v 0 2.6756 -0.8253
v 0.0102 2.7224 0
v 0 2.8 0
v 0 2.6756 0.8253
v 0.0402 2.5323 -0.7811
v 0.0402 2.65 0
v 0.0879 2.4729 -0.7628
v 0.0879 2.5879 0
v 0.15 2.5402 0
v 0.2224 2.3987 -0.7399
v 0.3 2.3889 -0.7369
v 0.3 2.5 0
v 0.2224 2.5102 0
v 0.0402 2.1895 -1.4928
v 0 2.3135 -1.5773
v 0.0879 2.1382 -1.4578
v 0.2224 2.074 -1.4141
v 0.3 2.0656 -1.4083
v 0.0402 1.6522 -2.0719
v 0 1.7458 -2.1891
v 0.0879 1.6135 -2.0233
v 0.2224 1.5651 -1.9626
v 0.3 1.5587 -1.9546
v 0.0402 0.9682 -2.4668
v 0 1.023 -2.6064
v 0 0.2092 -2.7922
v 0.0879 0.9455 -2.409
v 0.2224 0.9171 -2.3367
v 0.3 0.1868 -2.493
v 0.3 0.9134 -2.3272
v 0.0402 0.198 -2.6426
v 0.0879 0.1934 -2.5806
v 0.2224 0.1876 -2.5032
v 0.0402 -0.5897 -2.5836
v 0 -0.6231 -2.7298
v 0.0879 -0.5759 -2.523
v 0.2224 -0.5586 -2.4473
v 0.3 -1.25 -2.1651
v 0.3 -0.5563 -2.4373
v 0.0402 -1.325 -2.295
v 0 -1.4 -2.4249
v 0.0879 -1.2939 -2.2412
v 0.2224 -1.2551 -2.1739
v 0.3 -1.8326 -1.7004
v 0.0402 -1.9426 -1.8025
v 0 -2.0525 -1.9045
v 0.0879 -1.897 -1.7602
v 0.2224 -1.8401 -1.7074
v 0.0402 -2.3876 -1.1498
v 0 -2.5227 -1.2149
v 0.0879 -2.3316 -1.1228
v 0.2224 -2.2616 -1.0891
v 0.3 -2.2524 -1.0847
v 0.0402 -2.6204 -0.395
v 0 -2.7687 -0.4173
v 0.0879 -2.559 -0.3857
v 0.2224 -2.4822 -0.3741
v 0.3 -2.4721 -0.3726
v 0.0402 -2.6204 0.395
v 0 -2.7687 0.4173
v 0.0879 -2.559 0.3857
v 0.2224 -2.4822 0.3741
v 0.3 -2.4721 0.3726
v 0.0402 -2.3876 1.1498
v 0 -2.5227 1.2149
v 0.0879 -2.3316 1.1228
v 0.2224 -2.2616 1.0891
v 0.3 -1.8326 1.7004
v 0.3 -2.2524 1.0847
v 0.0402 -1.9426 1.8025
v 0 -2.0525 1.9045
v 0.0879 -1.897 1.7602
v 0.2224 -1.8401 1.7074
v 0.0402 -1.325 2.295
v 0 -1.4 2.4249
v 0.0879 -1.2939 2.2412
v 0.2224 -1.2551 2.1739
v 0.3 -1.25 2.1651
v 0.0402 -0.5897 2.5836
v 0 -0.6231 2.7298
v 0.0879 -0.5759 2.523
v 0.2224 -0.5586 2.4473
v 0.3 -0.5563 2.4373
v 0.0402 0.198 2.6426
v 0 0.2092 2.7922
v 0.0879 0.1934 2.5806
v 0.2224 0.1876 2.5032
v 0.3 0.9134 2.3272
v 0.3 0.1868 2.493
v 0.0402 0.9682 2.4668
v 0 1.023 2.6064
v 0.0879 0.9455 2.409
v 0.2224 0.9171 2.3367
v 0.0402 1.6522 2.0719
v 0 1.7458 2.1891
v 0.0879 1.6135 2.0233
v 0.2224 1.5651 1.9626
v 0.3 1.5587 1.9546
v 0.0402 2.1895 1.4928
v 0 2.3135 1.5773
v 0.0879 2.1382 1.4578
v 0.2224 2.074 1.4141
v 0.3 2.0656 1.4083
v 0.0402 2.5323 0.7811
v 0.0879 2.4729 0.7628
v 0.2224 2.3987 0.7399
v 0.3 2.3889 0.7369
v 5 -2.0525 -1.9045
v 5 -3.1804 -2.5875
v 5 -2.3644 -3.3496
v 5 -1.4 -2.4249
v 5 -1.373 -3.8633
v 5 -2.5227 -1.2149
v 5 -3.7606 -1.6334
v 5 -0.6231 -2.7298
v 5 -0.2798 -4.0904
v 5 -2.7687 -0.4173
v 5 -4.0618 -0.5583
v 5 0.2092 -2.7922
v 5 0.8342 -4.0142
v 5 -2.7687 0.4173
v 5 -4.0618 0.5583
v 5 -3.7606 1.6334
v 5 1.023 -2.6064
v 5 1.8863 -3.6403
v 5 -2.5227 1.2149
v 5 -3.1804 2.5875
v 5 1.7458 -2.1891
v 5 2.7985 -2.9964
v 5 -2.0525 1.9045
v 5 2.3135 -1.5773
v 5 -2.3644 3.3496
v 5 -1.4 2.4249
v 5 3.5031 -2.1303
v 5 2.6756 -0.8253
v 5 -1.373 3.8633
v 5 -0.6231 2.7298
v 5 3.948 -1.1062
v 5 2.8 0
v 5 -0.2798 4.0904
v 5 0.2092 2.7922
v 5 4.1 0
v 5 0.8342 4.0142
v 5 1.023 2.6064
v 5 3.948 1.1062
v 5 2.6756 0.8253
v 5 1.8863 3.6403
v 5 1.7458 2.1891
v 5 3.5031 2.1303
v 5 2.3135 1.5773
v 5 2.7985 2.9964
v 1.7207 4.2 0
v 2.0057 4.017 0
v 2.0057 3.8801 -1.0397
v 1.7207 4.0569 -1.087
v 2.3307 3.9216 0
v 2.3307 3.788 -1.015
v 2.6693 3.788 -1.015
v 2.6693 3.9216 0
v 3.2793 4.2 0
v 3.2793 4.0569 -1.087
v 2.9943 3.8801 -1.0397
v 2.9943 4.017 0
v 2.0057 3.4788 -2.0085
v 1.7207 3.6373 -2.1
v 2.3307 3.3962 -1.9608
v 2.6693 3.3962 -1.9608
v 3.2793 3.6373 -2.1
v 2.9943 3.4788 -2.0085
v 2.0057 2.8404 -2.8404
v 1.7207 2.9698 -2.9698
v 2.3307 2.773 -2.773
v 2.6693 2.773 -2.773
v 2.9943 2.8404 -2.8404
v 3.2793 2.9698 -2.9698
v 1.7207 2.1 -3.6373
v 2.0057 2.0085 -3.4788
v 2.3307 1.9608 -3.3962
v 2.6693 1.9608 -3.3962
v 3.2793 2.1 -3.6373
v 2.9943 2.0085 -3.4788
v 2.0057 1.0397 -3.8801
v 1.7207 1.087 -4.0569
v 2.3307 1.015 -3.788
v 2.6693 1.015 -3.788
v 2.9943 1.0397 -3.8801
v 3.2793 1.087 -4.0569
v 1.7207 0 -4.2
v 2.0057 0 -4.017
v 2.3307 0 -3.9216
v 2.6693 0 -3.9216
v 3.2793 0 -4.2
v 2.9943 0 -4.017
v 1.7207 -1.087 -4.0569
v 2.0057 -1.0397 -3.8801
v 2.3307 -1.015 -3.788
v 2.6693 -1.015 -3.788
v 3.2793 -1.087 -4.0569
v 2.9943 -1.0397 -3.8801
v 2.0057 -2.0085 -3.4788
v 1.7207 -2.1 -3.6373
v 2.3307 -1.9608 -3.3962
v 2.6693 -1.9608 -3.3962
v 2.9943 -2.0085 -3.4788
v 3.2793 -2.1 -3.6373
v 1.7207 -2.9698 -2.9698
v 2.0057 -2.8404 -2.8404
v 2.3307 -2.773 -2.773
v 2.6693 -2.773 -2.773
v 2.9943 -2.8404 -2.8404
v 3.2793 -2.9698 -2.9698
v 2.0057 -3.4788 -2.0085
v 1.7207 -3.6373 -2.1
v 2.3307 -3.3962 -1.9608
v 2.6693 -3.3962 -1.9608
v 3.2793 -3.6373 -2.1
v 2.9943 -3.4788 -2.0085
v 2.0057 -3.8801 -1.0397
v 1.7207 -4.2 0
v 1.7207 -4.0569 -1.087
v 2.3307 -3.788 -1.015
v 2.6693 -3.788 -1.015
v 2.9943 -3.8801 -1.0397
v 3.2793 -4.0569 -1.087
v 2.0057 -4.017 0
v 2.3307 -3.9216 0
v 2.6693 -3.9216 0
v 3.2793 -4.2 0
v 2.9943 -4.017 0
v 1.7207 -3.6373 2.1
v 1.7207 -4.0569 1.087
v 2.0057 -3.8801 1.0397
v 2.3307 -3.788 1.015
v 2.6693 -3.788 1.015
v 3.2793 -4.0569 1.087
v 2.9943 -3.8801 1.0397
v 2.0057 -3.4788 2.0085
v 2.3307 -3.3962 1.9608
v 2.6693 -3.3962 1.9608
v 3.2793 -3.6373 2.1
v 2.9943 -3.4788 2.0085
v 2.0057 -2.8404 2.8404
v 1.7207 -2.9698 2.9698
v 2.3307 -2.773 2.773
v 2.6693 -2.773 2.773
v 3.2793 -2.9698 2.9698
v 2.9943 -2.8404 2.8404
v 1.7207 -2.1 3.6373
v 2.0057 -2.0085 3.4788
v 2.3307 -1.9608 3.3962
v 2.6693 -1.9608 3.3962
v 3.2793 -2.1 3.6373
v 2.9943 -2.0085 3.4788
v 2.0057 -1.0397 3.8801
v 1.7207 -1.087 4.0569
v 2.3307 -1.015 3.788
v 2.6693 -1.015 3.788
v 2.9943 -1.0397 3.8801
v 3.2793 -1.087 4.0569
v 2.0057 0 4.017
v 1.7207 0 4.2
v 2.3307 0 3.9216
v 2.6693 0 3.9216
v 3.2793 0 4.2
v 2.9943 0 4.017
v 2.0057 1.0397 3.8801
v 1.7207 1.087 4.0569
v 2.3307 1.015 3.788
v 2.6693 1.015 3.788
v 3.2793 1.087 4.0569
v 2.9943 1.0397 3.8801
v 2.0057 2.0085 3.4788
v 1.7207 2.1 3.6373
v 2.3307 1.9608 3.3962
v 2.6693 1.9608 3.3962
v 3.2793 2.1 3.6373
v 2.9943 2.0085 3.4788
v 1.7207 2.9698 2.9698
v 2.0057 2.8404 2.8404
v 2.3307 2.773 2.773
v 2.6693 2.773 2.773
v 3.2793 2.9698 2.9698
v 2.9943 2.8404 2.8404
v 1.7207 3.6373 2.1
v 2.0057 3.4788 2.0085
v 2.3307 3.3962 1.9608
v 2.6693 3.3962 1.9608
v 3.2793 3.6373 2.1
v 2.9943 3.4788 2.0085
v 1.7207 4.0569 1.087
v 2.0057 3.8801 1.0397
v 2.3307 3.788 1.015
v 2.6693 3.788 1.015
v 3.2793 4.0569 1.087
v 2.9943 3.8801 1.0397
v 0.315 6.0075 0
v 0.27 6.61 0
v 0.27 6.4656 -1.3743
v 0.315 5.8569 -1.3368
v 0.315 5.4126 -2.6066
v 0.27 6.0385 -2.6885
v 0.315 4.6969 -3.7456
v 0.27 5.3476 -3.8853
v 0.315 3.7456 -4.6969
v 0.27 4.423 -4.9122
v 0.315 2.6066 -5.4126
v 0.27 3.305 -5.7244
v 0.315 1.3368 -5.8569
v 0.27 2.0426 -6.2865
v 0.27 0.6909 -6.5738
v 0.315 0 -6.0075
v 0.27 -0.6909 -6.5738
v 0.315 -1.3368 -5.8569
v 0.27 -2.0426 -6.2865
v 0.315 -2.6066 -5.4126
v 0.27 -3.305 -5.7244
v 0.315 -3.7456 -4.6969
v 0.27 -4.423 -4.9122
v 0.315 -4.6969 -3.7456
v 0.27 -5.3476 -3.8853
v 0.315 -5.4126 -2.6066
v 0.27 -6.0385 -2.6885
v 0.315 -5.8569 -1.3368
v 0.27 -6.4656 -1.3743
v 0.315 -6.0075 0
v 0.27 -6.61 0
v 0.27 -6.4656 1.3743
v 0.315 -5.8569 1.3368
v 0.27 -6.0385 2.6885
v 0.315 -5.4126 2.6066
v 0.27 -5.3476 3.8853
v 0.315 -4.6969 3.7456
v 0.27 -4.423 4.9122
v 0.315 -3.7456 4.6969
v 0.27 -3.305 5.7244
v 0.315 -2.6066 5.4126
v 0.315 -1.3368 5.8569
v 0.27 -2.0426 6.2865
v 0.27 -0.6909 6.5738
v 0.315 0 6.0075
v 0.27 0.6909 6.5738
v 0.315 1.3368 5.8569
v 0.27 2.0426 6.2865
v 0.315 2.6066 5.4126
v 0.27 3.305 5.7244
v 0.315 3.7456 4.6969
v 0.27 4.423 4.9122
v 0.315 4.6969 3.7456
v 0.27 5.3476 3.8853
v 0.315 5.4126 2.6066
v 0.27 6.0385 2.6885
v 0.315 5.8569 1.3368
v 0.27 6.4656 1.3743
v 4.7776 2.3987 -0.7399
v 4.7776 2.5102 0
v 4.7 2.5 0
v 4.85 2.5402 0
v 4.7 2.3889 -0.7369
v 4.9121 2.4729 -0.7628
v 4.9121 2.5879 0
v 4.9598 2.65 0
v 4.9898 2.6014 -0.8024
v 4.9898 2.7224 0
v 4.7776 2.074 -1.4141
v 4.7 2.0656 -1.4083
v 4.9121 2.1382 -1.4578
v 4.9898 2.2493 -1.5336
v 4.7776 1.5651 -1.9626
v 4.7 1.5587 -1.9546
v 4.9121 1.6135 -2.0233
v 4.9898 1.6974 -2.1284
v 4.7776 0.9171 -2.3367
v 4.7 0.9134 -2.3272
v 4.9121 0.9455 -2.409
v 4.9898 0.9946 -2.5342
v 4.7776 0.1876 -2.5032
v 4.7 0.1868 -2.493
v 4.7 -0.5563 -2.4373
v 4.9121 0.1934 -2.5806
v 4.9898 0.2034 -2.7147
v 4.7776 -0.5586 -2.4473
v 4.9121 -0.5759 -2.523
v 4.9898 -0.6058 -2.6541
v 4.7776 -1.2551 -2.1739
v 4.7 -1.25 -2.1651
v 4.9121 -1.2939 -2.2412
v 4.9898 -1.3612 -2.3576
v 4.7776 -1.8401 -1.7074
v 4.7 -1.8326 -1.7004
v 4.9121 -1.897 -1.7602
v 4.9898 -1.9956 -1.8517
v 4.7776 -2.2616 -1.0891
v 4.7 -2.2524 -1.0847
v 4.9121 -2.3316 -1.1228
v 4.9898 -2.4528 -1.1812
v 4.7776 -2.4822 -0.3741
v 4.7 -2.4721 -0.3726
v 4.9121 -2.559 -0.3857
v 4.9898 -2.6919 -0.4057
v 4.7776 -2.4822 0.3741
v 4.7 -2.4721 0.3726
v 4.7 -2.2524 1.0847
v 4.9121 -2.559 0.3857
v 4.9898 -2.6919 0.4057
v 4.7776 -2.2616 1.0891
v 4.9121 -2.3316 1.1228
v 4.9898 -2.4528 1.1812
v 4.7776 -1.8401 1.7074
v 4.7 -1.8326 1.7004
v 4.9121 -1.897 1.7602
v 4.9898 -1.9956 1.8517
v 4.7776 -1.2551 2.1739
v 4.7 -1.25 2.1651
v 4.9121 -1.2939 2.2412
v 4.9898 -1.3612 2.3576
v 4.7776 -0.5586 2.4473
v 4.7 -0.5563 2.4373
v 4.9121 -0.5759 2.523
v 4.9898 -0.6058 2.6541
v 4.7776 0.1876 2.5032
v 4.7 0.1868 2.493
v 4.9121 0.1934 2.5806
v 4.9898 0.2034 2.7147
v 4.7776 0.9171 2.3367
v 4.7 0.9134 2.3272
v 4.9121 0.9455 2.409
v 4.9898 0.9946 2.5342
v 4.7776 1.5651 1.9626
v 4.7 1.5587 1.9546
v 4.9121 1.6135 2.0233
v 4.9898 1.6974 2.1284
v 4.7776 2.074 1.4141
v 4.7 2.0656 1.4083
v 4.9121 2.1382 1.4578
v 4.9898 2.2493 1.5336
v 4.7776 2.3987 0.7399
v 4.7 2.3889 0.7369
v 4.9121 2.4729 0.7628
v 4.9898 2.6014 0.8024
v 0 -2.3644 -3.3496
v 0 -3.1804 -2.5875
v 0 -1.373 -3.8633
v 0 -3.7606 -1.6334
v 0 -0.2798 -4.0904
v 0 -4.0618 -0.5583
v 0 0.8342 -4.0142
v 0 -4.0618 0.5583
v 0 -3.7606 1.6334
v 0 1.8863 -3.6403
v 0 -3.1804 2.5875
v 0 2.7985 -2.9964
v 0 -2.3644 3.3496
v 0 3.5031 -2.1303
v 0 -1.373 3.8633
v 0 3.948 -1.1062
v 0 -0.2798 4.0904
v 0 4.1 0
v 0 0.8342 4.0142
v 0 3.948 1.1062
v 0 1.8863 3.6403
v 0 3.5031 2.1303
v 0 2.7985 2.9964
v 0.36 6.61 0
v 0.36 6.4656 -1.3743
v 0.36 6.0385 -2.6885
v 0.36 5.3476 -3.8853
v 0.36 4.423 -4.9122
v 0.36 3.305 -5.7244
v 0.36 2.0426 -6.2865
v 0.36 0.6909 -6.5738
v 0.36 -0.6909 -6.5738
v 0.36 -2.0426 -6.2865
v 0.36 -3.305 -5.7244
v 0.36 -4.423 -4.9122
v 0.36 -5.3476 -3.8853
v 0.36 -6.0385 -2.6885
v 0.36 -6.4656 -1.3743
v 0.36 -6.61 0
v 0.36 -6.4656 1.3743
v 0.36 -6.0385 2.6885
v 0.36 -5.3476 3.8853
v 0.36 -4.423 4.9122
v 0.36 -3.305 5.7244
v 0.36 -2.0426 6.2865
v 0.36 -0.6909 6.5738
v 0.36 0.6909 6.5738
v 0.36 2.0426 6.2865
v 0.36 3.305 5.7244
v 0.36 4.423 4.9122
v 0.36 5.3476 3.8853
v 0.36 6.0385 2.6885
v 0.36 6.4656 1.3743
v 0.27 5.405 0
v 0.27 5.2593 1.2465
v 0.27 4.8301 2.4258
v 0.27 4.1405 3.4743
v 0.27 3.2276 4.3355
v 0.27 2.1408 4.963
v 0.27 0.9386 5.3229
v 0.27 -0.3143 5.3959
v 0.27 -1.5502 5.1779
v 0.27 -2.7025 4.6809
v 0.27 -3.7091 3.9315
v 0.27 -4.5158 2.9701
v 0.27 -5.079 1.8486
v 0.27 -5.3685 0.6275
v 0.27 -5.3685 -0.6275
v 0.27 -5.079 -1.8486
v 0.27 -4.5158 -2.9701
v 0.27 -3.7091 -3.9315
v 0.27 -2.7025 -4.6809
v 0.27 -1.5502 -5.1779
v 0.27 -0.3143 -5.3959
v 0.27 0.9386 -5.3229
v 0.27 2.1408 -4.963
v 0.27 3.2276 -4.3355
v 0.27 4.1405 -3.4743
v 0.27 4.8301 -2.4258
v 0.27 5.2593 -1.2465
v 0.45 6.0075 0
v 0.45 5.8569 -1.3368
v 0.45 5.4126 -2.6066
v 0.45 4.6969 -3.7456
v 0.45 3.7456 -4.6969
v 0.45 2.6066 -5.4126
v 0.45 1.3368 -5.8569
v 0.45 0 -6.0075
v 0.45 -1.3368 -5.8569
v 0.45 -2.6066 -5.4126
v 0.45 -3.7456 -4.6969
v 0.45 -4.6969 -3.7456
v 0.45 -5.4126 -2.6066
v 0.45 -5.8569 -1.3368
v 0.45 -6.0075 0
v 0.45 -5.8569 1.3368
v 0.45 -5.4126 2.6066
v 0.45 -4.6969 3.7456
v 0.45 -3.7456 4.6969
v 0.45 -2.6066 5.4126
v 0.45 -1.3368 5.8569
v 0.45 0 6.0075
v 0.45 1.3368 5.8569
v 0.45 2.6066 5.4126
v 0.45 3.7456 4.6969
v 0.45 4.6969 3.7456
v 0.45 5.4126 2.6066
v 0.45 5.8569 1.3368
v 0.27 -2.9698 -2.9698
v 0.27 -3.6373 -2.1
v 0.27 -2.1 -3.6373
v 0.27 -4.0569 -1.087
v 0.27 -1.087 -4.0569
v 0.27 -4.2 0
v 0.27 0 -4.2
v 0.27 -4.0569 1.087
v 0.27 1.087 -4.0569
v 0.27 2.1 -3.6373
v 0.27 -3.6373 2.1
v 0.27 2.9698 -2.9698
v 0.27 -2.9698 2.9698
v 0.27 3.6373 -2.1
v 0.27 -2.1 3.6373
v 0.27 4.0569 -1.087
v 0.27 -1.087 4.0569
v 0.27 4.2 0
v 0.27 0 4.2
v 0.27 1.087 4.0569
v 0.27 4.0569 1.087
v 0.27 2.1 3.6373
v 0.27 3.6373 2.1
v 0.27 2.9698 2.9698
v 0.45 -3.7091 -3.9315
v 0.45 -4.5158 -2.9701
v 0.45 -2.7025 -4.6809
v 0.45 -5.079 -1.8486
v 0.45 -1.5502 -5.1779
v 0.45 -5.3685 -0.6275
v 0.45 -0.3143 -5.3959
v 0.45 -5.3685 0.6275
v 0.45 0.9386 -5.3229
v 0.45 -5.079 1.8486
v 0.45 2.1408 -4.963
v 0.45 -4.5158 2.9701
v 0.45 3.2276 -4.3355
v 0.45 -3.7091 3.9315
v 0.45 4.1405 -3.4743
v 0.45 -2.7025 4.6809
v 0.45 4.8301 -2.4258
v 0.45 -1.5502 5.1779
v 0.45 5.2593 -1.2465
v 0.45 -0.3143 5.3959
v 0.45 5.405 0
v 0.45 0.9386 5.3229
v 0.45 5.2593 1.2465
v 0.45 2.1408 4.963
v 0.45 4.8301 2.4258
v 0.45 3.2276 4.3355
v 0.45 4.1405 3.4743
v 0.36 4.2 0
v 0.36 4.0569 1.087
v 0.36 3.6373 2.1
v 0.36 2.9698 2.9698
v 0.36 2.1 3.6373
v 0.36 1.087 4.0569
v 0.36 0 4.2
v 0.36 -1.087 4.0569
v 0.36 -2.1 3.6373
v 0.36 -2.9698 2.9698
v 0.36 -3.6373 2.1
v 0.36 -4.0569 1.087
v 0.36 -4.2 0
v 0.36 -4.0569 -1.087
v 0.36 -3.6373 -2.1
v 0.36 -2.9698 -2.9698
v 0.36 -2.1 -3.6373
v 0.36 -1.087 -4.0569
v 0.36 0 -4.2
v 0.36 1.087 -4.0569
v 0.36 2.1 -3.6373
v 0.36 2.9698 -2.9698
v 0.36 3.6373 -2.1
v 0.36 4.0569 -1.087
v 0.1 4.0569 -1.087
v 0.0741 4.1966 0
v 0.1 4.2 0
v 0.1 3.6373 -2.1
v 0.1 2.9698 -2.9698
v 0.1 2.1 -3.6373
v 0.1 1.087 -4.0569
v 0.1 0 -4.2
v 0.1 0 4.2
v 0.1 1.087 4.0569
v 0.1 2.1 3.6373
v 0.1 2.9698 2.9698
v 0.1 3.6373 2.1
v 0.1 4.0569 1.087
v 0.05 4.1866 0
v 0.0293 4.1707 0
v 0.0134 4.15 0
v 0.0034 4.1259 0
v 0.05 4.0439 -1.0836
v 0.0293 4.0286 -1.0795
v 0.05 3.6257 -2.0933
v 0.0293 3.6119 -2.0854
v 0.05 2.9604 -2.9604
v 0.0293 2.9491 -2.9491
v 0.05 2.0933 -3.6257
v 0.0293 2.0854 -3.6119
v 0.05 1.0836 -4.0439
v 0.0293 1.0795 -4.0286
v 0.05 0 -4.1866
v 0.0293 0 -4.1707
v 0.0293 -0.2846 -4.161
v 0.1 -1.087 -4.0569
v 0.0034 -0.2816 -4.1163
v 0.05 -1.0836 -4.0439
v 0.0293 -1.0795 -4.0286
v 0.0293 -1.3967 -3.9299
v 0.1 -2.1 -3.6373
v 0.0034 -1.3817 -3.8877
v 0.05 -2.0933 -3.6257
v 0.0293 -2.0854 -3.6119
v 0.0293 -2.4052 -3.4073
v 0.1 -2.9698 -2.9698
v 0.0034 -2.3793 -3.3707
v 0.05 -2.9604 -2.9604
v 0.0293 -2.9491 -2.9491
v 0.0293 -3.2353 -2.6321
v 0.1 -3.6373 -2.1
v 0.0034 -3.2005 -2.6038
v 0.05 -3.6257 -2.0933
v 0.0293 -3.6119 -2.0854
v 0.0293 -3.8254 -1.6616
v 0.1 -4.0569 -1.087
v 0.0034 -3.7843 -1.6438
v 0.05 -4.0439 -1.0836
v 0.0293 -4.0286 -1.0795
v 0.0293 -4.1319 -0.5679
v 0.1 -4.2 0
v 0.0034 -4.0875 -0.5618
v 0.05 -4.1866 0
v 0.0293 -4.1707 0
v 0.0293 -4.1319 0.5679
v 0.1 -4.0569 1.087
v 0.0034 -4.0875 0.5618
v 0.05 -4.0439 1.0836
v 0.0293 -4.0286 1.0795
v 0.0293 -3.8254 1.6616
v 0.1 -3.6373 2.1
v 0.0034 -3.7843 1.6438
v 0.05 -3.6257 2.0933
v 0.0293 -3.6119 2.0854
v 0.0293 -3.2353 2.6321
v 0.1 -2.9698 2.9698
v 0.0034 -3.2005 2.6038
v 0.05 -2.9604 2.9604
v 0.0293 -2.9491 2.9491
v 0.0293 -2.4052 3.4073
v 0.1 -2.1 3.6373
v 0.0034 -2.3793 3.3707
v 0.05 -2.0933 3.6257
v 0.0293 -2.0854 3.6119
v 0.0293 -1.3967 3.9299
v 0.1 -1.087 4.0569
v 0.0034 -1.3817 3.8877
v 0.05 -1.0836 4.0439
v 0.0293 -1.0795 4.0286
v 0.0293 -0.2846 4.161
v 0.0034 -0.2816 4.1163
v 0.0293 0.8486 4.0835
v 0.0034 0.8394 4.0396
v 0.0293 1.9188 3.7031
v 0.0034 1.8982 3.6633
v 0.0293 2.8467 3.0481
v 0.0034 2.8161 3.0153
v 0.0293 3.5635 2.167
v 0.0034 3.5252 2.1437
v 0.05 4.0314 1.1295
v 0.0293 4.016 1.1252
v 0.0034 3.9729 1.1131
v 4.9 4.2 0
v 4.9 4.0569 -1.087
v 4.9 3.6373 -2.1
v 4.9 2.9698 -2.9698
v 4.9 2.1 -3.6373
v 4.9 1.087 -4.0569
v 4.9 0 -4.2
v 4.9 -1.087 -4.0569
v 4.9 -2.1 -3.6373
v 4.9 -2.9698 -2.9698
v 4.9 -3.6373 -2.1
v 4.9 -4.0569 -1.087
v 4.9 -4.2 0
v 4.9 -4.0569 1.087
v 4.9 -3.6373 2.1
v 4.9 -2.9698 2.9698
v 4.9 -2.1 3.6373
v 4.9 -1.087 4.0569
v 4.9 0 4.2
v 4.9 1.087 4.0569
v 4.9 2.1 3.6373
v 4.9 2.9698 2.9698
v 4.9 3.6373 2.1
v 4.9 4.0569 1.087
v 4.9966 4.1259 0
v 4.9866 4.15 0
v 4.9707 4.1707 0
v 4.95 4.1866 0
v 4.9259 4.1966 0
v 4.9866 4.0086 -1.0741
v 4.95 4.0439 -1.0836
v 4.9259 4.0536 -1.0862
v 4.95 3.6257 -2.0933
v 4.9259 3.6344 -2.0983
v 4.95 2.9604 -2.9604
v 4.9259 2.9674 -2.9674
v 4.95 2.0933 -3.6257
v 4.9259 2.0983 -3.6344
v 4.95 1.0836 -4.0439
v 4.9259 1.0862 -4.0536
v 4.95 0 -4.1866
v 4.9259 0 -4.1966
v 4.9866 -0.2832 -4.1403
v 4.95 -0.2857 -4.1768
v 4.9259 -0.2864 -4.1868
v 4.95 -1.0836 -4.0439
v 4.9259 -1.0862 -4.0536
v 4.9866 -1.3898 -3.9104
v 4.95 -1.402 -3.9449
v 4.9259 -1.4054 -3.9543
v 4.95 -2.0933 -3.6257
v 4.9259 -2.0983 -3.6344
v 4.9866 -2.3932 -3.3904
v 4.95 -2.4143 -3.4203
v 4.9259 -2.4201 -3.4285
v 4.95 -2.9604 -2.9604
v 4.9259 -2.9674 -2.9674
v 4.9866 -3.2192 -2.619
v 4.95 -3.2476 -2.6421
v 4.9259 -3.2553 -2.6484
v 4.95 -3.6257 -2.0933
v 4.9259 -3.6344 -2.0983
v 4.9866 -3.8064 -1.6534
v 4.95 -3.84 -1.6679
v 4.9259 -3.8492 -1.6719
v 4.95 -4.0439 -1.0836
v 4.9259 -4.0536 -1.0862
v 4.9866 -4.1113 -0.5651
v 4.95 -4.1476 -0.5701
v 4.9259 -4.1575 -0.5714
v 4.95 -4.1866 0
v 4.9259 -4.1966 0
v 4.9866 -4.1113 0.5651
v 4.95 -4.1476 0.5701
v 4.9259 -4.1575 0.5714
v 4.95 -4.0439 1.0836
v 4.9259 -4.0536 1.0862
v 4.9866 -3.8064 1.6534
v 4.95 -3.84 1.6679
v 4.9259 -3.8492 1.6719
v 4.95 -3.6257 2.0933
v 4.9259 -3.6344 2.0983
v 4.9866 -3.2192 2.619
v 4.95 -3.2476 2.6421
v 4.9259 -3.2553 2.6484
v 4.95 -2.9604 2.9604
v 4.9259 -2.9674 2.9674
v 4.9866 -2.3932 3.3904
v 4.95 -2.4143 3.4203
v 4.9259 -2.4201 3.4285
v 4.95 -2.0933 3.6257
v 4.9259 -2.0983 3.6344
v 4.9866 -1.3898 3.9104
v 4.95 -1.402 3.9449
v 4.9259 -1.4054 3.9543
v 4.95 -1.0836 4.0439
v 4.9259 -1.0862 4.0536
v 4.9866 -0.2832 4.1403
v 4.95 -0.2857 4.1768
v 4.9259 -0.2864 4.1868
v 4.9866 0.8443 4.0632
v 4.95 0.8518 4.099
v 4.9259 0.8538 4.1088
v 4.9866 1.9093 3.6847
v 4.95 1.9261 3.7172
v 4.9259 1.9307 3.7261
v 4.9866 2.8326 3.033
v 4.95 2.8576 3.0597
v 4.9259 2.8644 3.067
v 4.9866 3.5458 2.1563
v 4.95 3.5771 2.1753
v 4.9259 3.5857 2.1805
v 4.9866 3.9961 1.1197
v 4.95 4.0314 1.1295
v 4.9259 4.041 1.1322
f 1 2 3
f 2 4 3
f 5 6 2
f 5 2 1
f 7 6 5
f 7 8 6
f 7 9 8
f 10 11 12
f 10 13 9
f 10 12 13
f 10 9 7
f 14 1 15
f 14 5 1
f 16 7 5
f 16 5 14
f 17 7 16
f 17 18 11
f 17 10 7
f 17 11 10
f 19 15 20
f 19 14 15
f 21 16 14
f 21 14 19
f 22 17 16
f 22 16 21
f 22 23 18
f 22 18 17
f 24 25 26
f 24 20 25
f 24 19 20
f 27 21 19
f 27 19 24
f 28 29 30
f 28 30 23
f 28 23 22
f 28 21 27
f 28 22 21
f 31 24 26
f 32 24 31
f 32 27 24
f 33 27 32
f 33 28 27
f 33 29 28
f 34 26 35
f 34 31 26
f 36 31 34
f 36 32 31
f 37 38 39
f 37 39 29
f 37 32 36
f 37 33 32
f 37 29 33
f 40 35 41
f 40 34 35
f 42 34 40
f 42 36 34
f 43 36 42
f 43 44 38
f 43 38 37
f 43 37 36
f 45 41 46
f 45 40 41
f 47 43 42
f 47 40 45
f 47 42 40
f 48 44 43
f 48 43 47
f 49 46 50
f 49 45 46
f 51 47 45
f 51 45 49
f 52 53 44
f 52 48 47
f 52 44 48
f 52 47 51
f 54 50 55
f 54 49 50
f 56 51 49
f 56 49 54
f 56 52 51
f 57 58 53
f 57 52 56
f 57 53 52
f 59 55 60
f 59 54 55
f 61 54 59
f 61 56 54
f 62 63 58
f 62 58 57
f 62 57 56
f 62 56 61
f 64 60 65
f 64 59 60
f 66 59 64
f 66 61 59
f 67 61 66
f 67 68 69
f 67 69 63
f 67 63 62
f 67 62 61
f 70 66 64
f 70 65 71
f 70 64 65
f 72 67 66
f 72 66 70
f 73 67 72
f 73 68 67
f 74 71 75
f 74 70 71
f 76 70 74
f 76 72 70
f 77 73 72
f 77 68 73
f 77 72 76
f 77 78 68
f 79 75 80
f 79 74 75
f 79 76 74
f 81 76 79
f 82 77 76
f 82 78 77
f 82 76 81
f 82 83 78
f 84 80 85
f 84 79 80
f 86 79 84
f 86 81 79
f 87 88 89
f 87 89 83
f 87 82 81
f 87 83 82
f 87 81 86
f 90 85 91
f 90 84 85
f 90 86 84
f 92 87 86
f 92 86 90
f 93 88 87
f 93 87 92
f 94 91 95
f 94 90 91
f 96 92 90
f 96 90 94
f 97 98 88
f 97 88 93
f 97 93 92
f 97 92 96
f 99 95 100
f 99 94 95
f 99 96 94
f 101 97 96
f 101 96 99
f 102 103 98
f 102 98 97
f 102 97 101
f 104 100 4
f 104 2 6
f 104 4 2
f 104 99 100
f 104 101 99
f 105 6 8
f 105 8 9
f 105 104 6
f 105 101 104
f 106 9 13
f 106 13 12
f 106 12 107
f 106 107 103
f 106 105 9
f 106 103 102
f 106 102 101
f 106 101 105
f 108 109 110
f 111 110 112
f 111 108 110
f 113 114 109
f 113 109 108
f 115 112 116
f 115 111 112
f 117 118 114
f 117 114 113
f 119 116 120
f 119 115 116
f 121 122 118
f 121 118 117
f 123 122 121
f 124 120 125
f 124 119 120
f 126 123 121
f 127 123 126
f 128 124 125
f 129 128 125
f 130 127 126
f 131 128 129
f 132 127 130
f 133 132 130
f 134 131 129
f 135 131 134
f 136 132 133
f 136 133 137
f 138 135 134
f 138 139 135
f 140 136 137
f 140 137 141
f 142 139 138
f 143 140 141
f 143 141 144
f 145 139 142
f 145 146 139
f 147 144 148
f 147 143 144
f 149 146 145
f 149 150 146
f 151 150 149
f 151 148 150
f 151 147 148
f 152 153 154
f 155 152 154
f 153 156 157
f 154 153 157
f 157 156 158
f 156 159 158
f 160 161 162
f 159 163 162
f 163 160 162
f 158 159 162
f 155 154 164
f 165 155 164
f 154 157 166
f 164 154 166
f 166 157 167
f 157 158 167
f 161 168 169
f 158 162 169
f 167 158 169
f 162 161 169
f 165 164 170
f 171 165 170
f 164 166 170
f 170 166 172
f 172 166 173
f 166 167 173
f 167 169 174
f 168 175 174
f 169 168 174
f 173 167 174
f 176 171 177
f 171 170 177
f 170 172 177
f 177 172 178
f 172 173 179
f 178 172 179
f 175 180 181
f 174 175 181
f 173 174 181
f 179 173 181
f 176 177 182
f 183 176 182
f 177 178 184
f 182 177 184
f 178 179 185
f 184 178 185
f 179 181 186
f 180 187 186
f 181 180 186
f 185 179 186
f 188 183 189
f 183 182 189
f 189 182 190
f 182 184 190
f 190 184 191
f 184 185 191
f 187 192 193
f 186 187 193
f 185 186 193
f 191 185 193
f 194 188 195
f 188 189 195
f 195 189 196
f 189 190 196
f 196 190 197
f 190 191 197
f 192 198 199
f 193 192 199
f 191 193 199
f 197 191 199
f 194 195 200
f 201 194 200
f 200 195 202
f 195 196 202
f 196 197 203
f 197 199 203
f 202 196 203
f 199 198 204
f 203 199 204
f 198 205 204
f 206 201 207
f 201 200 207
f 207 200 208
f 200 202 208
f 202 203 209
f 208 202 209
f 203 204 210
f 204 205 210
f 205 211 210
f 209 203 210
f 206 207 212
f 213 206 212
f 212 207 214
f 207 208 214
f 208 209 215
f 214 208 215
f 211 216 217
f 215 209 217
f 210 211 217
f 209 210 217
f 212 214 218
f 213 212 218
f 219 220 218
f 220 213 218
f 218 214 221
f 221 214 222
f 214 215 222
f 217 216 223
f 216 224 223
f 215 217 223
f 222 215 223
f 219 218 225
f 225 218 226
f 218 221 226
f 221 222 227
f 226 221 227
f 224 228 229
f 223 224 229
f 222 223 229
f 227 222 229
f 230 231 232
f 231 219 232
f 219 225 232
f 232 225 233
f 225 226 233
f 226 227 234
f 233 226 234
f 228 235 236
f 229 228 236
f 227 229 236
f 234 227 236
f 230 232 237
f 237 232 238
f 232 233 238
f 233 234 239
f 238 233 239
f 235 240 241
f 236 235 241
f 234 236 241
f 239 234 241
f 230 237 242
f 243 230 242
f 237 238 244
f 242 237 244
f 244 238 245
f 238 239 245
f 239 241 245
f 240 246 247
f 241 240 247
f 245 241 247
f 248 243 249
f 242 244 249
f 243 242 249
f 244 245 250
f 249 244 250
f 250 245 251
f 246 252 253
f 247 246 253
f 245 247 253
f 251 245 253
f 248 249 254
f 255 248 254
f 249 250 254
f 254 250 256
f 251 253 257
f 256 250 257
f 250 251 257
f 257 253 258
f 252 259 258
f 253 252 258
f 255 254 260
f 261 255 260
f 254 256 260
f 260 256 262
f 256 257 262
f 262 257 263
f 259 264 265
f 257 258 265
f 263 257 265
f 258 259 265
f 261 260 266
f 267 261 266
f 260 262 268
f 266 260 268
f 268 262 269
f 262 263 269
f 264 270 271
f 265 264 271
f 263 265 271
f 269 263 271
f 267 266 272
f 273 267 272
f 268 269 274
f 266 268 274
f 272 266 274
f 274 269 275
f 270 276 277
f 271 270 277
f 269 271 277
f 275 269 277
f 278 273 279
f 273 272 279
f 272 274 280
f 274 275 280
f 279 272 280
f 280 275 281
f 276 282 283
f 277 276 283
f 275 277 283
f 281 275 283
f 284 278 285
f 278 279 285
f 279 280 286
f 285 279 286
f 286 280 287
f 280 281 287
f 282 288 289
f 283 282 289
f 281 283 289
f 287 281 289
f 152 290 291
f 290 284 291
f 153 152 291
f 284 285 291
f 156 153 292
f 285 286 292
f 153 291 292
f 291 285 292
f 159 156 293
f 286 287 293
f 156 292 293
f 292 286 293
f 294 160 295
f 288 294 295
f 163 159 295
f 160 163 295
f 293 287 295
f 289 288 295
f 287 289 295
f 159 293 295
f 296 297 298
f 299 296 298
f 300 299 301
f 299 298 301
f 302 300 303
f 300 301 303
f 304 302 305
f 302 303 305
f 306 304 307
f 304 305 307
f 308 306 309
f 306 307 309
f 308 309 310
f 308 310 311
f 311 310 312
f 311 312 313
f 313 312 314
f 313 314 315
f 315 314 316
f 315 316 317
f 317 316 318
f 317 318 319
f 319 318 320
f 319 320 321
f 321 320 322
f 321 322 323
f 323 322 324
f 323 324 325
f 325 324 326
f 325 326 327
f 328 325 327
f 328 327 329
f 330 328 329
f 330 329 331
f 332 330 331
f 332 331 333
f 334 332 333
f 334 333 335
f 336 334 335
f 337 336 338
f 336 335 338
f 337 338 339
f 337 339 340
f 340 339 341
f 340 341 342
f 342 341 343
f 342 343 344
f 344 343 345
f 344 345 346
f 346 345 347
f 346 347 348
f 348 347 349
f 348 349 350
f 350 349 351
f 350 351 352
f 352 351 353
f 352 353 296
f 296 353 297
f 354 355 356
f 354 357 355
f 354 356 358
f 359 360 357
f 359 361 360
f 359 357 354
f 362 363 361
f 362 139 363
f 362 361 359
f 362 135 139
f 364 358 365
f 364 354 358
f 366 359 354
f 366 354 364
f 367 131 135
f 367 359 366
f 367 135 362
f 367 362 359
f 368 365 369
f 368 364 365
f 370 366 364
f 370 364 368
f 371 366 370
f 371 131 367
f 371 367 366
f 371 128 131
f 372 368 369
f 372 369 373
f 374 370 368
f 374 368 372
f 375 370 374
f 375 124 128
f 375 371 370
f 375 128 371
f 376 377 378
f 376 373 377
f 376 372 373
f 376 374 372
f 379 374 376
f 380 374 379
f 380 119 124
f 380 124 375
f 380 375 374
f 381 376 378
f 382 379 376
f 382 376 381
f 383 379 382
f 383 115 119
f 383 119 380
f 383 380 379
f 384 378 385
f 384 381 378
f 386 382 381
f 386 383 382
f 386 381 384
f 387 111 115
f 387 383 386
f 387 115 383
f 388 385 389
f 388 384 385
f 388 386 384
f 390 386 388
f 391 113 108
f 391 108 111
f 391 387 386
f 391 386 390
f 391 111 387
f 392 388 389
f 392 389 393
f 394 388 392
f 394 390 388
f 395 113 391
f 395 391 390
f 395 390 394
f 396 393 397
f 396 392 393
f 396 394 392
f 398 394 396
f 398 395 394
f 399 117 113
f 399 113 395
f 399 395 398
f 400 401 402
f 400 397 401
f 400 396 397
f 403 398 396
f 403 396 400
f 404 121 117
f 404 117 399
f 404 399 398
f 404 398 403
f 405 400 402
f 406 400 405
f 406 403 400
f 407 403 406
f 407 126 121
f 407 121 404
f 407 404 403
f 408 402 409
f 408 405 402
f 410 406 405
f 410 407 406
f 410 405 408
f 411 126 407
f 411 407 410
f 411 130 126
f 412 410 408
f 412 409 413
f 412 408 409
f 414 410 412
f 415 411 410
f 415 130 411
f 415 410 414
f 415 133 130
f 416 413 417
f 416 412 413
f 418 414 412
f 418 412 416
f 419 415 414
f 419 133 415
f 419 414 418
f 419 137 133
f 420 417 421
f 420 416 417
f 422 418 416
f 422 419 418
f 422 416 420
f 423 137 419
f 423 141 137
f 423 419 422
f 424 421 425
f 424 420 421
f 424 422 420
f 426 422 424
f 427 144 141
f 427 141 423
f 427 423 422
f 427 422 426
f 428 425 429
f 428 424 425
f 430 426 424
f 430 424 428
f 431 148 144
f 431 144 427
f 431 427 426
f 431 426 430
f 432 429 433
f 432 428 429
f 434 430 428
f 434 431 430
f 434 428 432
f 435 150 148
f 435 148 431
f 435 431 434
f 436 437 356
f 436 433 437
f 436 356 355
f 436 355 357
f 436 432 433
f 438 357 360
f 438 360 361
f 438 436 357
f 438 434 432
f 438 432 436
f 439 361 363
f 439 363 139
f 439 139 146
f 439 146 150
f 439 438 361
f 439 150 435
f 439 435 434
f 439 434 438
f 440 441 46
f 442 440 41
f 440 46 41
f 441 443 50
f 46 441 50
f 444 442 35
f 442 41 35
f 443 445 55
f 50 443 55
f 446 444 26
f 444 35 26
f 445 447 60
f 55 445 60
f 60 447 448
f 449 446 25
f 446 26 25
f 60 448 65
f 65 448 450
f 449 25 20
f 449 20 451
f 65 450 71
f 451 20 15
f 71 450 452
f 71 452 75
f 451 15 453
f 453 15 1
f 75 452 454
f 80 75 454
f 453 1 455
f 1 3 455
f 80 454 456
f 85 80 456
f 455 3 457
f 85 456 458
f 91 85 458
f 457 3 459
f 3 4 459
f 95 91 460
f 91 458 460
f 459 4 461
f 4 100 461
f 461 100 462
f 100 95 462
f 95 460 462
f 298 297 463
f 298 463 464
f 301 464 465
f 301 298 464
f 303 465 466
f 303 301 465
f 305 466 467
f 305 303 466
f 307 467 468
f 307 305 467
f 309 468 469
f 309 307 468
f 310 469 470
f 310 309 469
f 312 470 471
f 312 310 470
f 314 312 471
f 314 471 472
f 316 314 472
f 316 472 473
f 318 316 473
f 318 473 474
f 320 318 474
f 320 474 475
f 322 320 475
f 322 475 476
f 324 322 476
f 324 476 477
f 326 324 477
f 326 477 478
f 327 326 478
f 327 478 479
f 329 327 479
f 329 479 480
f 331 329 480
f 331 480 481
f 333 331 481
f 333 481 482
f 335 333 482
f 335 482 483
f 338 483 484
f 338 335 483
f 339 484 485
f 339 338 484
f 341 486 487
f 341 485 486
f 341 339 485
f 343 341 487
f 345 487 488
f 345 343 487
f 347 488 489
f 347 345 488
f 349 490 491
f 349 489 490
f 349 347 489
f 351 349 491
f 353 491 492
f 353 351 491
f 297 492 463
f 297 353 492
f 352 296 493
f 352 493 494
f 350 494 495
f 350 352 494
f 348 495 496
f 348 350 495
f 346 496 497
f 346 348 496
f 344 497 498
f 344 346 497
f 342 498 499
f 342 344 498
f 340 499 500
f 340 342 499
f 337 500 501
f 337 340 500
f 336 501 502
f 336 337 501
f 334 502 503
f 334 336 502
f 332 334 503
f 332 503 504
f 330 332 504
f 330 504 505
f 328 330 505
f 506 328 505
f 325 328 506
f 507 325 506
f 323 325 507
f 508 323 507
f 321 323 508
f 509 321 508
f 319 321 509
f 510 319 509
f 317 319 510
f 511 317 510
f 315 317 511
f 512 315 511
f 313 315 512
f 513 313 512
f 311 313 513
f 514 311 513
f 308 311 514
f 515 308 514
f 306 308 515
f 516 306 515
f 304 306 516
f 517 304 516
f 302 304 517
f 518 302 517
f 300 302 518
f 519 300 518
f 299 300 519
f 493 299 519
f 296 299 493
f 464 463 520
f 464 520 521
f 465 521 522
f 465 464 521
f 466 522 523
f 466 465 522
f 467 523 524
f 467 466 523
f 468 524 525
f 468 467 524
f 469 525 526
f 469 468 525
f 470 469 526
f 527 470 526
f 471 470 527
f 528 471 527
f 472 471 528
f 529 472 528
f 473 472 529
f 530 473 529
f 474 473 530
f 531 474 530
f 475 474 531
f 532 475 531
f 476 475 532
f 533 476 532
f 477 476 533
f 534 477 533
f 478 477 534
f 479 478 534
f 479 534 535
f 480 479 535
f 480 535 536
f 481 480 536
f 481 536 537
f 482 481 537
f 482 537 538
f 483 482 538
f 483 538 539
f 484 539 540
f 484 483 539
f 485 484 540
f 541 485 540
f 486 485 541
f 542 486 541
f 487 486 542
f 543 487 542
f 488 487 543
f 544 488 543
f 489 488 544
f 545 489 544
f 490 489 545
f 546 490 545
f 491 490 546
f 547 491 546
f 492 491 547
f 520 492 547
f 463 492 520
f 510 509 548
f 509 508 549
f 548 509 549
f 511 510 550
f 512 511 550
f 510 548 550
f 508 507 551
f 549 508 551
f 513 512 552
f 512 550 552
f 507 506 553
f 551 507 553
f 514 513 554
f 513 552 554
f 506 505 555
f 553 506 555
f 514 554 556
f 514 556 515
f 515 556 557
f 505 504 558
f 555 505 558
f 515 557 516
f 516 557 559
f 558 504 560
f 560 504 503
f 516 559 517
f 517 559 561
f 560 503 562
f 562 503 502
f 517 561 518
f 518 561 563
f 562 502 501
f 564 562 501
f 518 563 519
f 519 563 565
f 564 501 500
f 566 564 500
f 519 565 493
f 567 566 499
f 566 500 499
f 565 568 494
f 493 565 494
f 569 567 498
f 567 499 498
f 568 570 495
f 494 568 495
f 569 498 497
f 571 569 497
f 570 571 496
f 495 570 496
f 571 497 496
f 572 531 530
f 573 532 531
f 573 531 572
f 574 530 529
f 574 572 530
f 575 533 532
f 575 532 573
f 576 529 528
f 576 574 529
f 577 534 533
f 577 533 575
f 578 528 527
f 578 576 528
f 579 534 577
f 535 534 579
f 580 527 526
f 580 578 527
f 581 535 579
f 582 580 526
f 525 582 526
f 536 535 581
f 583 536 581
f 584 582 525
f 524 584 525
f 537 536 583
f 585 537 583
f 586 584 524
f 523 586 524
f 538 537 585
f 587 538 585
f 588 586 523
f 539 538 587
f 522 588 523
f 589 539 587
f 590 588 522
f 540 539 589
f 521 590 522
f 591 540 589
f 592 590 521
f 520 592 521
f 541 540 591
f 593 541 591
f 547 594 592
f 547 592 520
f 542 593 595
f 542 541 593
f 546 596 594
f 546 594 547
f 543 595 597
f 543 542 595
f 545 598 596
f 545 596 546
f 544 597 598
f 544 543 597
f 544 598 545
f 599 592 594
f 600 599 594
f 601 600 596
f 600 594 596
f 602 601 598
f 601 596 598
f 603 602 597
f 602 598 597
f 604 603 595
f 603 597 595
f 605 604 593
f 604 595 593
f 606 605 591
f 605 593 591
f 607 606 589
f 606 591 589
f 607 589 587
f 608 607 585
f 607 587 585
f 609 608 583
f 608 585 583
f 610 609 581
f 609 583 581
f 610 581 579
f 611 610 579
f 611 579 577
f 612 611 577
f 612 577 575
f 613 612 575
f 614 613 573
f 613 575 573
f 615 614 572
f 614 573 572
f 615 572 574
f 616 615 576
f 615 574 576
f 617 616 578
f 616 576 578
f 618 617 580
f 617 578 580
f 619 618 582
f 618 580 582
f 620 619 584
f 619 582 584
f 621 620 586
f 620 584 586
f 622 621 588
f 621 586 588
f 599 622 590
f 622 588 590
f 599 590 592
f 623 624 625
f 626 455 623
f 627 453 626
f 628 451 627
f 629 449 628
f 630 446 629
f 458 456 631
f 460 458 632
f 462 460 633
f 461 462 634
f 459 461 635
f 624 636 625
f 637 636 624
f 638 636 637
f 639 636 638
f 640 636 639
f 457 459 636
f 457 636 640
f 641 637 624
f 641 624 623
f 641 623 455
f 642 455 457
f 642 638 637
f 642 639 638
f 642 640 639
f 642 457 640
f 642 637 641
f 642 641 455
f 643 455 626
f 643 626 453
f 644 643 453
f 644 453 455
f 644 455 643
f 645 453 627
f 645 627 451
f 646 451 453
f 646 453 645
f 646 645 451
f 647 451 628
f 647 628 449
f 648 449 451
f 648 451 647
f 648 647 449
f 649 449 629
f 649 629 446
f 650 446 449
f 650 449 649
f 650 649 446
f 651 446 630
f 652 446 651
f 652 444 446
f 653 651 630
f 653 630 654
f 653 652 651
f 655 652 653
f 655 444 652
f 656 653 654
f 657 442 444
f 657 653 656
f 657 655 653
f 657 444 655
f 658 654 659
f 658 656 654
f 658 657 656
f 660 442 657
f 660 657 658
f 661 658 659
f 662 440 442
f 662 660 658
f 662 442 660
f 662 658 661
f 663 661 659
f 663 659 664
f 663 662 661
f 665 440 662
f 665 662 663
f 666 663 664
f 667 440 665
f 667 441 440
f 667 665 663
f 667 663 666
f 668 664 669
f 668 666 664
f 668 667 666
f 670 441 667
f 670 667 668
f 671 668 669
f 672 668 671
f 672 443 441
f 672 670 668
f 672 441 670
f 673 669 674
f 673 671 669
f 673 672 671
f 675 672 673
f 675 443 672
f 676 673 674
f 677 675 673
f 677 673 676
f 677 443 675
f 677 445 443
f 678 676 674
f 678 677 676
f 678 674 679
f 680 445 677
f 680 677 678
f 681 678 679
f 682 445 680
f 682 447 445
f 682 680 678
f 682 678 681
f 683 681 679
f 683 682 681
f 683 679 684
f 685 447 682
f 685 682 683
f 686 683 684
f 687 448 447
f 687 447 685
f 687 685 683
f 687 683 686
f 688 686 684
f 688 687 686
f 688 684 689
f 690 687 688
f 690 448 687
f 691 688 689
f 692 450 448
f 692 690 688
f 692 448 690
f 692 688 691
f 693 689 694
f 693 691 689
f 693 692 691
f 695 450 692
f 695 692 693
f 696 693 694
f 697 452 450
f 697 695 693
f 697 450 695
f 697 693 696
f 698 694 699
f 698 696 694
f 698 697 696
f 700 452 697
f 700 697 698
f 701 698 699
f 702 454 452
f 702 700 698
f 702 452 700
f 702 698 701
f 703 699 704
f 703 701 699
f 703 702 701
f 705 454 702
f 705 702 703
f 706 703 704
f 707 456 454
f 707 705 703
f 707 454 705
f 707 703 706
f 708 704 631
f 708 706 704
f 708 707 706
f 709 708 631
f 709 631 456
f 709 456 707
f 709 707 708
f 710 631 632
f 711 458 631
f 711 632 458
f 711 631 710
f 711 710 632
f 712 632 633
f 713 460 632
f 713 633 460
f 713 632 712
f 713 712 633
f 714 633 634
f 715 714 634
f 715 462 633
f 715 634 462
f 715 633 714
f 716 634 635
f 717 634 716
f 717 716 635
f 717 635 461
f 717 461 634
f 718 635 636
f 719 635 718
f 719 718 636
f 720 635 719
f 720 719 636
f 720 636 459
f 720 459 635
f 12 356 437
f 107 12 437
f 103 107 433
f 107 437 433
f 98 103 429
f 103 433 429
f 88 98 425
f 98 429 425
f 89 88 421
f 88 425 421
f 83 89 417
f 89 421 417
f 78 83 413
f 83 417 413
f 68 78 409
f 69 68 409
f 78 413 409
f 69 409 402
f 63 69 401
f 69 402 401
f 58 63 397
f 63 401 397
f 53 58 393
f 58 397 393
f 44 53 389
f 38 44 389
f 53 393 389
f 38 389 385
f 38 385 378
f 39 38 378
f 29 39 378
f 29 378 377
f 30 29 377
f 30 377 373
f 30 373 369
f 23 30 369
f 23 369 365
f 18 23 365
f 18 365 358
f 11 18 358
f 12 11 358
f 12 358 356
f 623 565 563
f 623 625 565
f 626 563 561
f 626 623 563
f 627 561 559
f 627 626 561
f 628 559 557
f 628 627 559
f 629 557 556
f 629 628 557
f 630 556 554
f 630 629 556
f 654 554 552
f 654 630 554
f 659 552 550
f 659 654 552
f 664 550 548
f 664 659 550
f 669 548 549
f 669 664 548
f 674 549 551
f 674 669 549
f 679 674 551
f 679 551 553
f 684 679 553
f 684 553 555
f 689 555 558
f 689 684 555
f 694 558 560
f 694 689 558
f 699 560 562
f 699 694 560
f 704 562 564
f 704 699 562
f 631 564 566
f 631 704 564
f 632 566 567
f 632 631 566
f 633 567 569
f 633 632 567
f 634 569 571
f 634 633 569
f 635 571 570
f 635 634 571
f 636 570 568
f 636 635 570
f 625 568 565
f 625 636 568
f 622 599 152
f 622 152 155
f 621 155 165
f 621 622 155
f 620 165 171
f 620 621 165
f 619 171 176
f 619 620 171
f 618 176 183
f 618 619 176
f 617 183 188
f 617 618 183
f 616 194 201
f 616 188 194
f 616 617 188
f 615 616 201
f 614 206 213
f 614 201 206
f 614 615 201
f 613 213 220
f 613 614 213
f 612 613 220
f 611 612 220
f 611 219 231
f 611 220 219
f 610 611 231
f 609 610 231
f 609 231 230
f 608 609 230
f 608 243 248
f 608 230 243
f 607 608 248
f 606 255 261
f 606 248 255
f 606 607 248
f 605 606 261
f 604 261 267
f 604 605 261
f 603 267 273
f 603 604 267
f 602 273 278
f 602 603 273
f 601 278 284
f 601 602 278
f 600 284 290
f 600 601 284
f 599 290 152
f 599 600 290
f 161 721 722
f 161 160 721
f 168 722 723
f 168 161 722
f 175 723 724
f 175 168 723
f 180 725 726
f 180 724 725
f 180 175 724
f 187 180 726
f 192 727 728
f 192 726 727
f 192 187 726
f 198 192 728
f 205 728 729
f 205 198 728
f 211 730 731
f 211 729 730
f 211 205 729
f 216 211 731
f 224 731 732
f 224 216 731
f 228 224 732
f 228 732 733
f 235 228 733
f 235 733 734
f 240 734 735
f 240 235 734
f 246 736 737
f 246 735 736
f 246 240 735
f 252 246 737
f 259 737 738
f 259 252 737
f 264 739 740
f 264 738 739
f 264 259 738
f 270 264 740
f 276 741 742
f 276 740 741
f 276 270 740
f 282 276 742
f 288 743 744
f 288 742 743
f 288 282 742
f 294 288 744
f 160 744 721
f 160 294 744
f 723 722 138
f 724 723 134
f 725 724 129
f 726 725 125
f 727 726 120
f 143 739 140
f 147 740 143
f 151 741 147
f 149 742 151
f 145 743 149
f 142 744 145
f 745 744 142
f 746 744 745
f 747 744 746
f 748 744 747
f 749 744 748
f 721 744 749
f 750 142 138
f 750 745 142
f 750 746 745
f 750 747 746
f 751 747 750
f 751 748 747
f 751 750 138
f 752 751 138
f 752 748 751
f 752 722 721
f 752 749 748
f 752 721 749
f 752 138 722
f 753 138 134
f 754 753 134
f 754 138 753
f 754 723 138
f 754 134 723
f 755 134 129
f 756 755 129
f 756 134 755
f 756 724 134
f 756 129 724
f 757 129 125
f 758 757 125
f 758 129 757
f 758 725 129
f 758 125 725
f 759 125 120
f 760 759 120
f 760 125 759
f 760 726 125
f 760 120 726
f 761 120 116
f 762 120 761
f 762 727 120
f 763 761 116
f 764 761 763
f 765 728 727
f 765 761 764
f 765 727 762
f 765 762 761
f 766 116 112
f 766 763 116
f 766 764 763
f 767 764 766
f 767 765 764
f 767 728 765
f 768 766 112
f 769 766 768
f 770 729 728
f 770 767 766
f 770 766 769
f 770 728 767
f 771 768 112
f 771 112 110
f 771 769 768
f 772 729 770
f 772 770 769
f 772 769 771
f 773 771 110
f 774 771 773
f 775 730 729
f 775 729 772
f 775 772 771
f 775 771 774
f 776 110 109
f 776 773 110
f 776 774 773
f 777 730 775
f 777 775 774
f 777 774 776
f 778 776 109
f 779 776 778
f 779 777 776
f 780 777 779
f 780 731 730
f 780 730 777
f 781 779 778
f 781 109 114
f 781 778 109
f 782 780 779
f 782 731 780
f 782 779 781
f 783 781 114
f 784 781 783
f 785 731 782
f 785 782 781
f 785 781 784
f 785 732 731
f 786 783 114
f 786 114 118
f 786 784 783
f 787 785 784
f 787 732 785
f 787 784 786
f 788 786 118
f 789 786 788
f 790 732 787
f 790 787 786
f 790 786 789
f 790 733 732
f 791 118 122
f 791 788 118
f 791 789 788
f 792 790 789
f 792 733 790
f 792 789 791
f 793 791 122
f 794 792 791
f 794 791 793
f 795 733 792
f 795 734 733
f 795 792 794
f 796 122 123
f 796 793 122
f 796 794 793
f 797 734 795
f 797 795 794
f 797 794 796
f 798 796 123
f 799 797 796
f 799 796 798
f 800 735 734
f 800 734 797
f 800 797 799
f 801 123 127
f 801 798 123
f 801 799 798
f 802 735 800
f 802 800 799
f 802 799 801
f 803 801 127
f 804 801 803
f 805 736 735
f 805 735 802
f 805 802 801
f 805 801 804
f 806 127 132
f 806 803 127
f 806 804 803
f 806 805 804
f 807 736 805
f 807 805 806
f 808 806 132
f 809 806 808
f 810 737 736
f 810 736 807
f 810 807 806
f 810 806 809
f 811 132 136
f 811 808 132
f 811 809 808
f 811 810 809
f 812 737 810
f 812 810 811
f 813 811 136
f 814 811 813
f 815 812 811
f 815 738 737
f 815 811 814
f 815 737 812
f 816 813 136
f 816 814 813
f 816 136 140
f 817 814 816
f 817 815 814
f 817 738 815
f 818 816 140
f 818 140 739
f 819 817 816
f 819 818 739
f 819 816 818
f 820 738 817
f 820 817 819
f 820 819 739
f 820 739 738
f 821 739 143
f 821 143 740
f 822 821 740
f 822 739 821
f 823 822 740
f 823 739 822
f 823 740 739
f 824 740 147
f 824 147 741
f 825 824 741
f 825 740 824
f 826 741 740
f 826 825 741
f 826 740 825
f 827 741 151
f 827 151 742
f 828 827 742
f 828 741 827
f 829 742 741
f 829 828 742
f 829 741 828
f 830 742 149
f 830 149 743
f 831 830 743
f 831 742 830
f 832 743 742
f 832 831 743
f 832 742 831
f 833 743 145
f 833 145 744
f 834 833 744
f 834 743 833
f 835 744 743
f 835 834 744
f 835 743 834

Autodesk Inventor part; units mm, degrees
ref_plane "YZ Plane" through (0, 0, 0) normal (1, 0, 0) x (0, 1, 0)
ref_plane "XZ Plane" through (0, 0, 0) normal (0, 1, 0) x (-1, 0, 0)
ref_plane "XY Plane" through (0, 0, 0) normal (0, 0, 1) x (1, 0, 0)
sketch "Sketch_62" plane through (0, 0, 0) normal (0, 0, 1) x (1, 0, 0)
  line L0 (50, 0) -> (-50, 0)
  line L1 (0, 4.1) -> (0, 2.8)
  arc A0 (0, 2.8) -> (0.3, 2.5) centre (0.3, 2.8) ccw
  line L2 (0.3, 2.5) -> (4.7, 2.5)
  arc A1 (4.7, 2.5) -> (5, 2.8) centre (4.7, 2.8) ccw
  line L3 (5, 2.8) -> (5, 4.1)
  arc A2 (5, 4.1) -> (4.9, 4.2) centre (4.9, 4.1) ccw
  line L4 (4.9, 4.2) -> (3.2793, 4.2)
  arc A3 (1.7207, 4.2) -> (3.2793, 4.2) centre (2.5, 5.1) ccw
  line L5 (1.7207, 4.2) -> (0.1, 4.2)
  arc A4 (0.1, 4.2) -> (0, 4.1) centre (0.1, 4.1) ccw
revolve "Revolution1" add sketch "Sketch_62" angle 360 about axis through (50, 0, 0) along (1, 0, 0)
sketch "Sketch_63" plane through (0, 0, 0) normal (0, 0, 1) x (1, 0, 0)
  line L0 (50, 0) -> (-50, 0)
  line L1 (0.27, 6.61) -> (0.315, 6.0075)
  line L2 (0.315, 6.0075) -> (0.27, 5.405)
  line L3 (0.27, 5.405) -> (0.27, 4.2)
  line L4 (0.27, 4.2) -> (0.36, 4.2)
  line L5 (0.36, 4.2) -> (0.45, 5.405)
  line L6 (0.45, 5.405) -> (0.45, 6.0075)
  line L7 (0.45, 6.0075) -> (0.36, 6.61)
  line L8 (0.36, 6.61) -> (0.27, 6.61)
revolve "Revolution2" add sketch "Sketch_63" angle 360 about axis through (50, 0, 0) along (1, 0, 0)
properties part number "625-Z_PART1"
